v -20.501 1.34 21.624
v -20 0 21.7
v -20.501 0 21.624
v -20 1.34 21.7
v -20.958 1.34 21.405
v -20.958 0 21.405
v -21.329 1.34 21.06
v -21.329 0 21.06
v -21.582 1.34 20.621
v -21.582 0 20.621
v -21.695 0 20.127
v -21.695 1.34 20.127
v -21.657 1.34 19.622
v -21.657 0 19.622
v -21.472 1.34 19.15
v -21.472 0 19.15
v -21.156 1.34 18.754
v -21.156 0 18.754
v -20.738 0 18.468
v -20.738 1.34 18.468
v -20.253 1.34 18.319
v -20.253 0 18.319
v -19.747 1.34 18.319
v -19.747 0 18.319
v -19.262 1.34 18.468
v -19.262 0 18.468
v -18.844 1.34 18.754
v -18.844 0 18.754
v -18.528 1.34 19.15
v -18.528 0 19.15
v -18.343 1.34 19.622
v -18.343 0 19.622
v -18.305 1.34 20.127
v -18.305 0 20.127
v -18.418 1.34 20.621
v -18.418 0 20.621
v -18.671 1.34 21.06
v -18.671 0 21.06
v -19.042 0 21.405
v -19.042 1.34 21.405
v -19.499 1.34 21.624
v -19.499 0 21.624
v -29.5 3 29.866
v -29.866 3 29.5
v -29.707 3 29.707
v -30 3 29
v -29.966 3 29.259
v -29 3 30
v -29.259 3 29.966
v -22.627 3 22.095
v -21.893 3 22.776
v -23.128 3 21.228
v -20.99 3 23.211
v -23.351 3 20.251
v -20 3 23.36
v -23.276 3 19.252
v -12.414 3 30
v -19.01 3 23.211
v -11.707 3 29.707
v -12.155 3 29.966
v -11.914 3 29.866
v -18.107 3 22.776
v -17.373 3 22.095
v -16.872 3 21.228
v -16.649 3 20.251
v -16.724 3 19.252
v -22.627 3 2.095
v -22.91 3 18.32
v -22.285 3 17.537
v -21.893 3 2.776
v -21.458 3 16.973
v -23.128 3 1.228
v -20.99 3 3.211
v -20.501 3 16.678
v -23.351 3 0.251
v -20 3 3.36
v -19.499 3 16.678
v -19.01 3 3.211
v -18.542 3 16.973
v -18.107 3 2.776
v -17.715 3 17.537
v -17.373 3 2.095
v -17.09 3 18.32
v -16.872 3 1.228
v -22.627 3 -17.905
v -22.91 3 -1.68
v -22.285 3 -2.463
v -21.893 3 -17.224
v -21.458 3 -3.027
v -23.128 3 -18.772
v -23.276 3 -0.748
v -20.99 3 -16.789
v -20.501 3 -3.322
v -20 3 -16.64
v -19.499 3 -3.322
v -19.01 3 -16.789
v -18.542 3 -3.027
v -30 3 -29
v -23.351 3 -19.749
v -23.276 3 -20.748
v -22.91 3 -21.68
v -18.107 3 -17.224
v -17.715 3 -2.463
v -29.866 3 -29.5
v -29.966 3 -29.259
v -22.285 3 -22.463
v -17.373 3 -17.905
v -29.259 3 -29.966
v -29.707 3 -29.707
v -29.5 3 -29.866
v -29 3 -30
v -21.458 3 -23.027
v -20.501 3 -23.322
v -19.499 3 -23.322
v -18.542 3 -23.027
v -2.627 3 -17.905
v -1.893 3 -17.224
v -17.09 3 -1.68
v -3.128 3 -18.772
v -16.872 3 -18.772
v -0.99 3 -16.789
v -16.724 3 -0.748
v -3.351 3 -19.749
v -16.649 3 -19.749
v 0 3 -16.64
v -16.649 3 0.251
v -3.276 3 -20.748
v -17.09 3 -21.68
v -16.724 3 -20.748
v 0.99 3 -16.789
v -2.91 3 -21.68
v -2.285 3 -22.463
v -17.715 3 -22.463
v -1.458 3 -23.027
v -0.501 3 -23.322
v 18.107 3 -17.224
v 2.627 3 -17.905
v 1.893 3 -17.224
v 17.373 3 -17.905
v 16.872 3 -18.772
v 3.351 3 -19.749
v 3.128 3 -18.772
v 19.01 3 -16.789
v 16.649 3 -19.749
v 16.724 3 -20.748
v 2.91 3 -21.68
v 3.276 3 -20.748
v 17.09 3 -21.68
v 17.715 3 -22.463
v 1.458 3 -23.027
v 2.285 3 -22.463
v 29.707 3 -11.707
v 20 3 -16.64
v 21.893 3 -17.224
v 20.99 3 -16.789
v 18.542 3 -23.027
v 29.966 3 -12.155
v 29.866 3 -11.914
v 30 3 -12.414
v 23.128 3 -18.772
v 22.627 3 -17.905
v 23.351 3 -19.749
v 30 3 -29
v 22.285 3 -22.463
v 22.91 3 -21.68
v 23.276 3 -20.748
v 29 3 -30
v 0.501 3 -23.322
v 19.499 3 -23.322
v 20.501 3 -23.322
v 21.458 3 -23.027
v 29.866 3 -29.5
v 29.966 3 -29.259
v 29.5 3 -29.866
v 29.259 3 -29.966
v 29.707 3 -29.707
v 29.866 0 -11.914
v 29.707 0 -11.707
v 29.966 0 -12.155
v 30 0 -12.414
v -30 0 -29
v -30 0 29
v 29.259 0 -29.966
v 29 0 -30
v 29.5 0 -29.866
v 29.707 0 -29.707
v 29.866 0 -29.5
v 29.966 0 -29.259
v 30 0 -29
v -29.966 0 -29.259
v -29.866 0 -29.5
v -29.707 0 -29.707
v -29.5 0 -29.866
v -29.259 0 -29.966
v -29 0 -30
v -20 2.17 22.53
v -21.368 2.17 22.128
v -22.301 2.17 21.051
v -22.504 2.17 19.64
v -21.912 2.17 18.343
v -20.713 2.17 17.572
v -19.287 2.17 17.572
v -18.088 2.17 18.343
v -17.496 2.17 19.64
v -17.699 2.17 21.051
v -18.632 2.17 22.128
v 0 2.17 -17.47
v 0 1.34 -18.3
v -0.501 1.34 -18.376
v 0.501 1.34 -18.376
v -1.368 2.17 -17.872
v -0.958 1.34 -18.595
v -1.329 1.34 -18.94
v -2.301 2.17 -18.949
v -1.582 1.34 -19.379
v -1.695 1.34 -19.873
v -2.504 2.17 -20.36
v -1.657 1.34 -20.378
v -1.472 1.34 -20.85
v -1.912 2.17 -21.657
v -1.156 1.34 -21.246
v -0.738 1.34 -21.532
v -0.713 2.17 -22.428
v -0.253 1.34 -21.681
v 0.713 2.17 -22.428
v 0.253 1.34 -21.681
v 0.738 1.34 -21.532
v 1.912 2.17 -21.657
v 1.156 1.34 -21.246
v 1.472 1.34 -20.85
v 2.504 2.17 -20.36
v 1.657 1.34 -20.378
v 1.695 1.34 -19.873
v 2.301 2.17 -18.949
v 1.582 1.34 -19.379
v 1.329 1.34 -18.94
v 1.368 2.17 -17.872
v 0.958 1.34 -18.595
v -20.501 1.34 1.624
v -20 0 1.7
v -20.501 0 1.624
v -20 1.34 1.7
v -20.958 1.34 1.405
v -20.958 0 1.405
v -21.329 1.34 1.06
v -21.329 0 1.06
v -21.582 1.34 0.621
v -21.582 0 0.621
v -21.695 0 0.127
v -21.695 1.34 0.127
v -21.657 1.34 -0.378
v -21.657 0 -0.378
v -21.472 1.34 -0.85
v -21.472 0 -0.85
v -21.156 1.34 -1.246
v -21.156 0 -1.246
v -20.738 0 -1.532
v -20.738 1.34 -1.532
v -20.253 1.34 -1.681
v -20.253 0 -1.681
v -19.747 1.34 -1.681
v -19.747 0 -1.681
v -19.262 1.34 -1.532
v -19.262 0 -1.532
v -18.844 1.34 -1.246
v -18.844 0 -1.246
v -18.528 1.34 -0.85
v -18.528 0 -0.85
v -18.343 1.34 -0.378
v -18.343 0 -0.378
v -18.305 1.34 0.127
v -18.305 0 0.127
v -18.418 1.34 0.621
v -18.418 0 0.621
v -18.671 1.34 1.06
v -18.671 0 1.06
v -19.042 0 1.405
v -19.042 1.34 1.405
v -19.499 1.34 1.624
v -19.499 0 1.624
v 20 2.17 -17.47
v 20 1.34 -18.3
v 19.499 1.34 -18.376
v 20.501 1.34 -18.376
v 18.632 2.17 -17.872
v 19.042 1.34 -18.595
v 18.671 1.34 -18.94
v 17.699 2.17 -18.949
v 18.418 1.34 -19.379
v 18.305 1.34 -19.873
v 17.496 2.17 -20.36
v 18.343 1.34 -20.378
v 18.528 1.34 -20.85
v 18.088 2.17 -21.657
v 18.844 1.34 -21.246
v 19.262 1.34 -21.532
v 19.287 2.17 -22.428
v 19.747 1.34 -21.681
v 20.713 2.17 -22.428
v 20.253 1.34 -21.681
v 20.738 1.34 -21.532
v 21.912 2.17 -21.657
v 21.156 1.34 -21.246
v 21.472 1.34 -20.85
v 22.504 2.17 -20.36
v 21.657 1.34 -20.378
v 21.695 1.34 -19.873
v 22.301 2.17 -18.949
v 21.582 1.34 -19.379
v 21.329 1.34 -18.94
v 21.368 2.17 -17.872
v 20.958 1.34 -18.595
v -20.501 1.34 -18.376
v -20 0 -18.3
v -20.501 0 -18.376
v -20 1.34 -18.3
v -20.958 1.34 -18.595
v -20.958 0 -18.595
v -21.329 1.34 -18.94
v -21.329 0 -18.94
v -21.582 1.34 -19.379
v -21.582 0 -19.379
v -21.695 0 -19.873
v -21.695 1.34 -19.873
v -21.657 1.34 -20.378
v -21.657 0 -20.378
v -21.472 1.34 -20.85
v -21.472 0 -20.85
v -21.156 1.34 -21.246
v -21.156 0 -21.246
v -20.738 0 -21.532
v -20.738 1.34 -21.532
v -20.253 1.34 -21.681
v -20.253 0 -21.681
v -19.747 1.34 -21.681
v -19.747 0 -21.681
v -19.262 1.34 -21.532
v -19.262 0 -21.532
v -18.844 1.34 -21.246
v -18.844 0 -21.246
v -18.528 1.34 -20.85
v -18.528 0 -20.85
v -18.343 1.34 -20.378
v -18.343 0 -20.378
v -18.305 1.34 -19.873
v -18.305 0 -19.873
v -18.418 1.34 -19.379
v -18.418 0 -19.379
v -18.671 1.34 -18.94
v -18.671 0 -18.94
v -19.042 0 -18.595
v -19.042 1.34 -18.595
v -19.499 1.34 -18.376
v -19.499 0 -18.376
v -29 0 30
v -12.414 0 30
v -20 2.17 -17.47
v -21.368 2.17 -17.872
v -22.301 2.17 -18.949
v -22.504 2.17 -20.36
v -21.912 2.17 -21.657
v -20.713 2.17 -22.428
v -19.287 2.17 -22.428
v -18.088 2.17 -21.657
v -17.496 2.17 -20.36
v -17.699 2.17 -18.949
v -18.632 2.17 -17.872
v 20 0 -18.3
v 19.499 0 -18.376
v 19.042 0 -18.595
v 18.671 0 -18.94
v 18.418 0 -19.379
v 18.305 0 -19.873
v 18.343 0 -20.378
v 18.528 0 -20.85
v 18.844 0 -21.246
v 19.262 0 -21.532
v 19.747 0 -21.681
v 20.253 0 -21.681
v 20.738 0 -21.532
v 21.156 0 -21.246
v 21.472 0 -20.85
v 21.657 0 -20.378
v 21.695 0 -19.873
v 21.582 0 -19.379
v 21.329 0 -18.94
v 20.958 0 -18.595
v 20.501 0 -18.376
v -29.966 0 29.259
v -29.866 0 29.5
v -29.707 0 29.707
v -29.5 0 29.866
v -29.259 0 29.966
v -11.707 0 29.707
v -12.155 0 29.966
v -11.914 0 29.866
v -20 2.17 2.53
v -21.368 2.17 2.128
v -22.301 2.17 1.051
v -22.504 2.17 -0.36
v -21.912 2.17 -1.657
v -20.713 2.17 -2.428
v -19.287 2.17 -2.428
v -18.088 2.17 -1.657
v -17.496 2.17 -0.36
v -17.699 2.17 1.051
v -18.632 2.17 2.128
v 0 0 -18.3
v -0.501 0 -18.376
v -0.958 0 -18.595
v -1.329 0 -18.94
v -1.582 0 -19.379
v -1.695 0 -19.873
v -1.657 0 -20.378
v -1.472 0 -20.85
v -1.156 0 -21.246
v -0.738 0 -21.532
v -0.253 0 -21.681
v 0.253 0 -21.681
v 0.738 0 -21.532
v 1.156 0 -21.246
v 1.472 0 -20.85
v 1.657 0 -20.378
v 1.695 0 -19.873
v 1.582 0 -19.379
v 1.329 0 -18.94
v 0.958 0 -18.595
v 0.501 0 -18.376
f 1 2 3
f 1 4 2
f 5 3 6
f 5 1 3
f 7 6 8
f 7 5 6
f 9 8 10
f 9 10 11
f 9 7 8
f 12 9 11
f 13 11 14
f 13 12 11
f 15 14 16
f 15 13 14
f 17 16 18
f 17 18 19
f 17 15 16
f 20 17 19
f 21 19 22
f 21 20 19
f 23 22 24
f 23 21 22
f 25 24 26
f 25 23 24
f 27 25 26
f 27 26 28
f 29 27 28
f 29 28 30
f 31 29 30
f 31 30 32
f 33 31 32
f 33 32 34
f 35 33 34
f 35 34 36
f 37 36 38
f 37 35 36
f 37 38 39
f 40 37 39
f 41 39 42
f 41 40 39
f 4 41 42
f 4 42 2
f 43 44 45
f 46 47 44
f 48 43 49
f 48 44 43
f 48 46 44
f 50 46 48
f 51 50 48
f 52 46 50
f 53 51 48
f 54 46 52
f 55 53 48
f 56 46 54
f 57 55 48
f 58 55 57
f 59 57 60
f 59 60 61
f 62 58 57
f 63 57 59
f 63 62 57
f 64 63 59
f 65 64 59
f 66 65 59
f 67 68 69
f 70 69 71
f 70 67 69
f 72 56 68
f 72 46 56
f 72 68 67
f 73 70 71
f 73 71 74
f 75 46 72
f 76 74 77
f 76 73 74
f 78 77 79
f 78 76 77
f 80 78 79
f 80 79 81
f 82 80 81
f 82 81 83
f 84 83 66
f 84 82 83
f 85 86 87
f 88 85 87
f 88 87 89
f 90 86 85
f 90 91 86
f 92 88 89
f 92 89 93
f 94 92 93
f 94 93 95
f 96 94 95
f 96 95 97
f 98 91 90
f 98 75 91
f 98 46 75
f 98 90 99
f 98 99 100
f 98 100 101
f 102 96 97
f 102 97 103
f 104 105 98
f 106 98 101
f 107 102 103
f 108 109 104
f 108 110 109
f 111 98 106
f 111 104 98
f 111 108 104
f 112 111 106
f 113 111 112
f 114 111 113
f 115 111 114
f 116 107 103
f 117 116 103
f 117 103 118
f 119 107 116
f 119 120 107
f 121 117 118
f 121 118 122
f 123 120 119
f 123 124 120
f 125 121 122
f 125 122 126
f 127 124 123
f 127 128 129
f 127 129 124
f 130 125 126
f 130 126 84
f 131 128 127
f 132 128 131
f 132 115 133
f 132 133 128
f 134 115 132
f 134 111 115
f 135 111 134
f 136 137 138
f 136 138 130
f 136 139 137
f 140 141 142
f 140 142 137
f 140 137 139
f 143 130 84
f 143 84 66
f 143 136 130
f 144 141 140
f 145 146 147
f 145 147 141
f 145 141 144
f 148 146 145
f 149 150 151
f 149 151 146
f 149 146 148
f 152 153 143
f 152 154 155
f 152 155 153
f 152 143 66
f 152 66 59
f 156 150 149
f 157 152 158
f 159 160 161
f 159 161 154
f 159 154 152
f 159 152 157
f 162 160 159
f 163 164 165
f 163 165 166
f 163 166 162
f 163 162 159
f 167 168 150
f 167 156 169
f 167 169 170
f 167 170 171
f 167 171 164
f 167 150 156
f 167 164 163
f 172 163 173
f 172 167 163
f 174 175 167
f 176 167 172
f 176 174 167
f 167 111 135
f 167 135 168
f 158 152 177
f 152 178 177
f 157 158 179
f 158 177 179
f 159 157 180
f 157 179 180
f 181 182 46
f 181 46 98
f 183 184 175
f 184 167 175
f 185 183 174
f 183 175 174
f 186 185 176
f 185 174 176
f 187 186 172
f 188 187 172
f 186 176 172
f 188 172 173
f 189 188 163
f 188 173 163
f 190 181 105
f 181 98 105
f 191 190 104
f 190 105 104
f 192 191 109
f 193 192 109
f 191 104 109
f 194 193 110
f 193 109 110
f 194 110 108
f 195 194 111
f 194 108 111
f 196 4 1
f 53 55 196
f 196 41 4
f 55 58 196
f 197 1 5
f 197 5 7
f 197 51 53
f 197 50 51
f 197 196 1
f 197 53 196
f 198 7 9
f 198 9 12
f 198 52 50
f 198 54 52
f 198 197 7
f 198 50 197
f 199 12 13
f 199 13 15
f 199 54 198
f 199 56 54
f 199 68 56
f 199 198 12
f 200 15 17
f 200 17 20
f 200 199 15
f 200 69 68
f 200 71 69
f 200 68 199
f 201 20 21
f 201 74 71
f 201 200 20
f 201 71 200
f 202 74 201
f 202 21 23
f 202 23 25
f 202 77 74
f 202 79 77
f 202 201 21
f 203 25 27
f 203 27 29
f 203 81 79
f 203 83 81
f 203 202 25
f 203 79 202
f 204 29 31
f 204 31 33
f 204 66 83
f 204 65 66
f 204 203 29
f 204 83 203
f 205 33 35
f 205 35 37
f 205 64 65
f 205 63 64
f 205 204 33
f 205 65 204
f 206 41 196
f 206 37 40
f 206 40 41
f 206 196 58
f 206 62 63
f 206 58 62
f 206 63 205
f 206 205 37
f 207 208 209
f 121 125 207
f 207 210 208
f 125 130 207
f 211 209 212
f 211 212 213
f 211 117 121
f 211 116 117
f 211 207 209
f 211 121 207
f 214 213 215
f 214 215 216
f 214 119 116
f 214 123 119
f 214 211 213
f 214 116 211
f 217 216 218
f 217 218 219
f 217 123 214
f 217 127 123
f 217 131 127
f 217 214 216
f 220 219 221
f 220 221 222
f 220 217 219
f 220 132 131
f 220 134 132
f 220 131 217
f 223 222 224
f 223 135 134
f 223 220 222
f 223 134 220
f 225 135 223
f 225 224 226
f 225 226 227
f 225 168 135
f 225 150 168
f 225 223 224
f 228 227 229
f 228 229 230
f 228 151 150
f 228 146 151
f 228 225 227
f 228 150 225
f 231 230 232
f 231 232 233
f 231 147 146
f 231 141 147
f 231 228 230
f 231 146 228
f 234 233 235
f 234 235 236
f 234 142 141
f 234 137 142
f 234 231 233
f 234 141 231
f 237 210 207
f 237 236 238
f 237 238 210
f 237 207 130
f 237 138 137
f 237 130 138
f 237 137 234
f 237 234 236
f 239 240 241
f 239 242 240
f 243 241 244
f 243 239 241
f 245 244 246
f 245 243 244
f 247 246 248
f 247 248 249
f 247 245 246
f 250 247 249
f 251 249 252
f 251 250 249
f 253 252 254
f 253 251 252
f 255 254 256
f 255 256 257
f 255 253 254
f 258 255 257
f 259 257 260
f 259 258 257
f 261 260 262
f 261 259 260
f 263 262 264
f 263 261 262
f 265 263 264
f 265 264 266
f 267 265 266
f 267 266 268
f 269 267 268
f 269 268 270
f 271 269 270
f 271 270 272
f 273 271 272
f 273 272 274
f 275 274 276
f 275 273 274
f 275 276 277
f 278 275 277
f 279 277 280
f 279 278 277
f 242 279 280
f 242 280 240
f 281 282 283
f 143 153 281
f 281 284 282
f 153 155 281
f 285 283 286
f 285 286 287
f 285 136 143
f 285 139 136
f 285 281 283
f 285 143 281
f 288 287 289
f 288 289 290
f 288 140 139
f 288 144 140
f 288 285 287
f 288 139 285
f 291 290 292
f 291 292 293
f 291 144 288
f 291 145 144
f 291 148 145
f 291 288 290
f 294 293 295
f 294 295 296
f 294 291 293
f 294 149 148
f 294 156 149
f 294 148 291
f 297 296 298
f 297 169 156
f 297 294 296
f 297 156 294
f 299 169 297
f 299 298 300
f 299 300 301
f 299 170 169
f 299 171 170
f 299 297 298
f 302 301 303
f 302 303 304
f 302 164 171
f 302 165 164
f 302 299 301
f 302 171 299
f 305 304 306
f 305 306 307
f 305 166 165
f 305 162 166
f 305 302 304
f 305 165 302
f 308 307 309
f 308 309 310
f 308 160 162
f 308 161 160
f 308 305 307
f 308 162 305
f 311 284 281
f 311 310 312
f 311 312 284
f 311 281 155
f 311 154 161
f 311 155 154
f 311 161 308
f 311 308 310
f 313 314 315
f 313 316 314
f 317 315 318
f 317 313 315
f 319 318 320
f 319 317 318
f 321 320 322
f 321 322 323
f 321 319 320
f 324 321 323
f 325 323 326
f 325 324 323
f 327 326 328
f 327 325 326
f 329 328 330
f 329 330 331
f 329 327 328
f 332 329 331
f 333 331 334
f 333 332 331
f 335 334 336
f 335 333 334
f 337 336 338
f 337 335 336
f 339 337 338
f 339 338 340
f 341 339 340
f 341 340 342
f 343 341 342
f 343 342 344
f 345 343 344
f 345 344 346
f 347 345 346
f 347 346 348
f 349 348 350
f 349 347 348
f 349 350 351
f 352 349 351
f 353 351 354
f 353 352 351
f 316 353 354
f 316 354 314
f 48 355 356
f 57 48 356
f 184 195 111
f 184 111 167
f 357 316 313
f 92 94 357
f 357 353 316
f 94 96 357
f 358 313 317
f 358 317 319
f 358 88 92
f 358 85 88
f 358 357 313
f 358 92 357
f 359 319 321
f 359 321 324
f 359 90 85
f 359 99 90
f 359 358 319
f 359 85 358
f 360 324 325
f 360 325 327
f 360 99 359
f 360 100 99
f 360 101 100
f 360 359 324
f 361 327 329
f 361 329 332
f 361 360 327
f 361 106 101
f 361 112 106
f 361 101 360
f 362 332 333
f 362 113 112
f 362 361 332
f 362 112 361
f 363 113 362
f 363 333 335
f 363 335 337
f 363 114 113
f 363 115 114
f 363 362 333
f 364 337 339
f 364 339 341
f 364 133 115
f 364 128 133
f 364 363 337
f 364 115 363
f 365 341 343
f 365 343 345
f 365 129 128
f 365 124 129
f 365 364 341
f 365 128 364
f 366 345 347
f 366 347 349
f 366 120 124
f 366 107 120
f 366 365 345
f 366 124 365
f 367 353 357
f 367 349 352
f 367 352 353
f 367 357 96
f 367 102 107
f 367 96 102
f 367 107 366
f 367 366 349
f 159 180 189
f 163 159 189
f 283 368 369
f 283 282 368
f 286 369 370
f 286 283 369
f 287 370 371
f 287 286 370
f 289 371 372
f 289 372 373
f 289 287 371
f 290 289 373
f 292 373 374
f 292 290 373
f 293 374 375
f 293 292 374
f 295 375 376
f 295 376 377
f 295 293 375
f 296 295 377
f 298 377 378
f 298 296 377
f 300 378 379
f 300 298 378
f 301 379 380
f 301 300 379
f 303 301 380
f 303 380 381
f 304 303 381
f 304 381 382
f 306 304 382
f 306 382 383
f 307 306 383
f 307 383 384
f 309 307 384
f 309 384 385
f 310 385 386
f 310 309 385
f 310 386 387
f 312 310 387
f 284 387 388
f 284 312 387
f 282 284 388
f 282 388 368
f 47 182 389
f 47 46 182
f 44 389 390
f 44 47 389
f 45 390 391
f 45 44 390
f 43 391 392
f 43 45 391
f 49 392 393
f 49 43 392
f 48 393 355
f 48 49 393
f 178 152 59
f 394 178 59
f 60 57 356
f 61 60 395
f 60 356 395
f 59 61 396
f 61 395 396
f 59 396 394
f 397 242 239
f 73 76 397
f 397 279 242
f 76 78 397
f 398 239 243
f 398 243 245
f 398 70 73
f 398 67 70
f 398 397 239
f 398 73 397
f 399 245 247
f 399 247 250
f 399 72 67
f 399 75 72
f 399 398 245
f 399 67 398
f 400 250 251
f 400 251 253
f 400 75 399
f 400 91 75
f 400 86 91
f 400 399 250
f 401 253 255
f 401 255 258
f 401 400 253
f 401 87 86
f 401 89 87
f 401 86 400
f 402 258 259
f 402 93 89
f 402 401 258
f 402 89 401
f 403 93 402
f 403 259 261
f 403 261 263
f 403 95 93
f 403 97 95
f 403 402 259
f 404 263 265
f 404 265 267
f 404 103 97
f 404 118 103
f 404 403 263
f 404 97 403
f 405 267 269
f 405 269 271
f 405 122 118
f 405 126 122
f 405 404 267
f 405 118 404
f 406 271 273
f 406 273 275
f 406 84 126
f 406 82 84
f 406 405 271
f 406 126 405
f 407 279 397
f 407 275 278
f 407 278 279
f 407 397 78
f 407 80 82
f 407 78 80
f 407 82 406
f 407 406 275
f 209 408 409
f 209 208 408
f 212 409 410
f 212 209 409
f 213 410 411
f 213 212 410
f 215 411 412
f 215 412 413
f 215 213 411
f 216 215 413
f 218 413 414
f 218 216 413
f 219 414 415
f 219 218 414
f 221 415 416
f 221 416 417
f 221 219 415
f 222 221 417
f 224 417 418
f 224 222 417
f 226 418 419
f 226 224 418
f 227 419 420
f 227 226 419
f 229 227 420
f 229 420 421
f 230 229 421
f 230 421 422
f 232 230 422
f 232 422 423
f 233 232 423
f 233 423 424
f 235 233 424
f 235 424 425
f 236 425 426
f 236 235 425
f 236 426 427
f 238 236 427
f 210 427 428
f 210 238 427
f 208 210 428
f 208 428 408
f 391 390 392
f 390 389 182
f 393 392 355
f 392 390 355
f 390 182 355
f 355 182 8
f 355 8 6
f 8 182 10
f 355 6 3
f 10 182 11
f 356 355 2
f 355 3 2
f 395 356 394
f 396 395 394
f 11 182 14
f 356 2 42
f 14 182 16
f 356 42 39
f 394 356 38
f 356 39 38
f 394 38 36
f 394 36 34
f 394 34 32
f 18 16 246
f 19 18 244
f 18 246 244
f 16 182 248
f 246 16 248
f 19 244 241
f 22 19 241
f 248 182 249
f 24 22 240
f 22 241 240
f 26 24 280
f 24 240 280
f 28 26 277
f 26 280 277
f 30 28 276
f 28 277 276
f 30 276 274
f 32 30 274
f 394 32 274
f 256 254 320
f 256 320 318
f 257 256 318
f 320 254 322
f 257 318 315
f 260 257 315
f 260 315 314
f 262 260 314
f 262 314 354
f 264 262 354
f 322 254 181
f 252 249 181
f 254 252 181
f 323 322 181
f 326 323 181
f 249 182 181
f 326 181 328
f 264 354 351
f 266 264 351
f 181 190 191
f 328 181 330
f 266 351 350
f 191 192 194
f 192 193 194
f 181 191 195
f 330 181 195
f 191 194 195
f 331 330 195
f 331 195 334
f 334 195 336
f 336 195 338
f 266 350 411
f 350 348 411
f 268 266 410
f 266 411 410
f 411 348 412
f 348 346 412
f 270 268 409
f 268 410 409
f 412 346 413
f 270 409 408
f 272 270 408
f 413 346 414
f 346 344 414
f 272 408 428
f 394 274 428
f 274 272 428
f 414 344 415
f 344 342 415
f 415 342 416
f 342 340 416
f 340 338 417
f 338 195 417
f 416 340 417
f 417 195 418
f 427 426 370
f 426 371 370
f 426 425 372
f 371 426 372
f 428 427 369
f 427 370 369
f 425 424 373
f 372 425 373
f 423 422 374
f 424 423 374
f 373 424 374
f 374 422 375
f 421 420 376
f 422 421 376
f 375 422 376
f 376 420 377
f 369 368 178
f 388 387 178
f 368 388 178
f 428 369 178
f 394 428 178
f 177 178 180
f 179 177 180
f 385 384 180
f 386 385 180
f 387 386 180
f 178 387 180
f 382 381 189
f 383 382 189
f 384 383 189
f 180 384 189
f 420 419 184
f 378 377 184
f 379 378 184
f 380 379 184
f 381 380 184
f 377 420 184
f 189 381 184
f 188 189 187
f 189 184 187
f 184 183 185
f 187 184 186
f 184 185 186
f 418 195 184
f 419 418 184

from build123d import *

# Parameters (mm, degrees)
SKETCH2_W                                    = 60
SKETCH2_H                                    = 60
BOSS_EXTRUDE1_DEPTH                          = 3
CUT_EXTRUDE1_DEPTH                           = 10
CSK_FOR_M3_HEX_SOCKET_COUNTERSUNK_CA_2_COUNT = 2
CSK_FOR_M3_HEX_SOCKET_COUNTERSUNK_CA_2_PITCH = 20
CSK_FOR_M3_HEX_SOCKET_COUNTERSUNK_CA_3_COUNT = 2
CSK_FOR_M3_HEX_SOCKET_COUNTERSUNK_CA_3_PITCH = 40
CSK_FOR_M3_HEX_SOCKET_COUNTERSUNK_CA_4_COUNT = 2
CSK_FOR_M3_HEX_SOCKET_COUNTERSUNK_CA_4_PITCH = 20
CSK_FOR_M3_HEX_SOCKET_COUNTERSUNK_CA_5_COUNT = 2
CSK_FOR_M3_HEX_SOCKET_COUNTERSUNK_CA_5_PITCH = 40
FILLET1_R                                    = 1


with BuildPart() as part:
    # Sketch2 → Boss-Extrude1 (new body)
    with BuildSketch(Plane(origin=(0, 0, 0), x_dir=(1, 0, 0), z_dir=(0, 1, 0))):
        Rectangle(SKETCH2_W, SKETCH2_H)
    extrude(amount=BOSS_EXTRUDE1_DEPTH)

    # Sketch3 → Cut-Extrude1 (cut)
    with BuildSketch(Plane(origin=(0, 3, 0), x_dir=(1, 0, 0), z_dir=(0, 1, 0))):
        Polygon((30, 12), (-12, -30), (30, -30), align=None)
    extrude(amount=-CUT_EXTRUDE1_DEPTH, mode=Mode.SUBTRACT)

    # Sketch6 → CSK for M3 Hex Socket Countersunk Cap Screw1 (revolve, cut)
    with BuildSketch(Plane(origin=(-20, 3, -20), x_dir=(0, 0, 1), z_dir=(1, 0, 0))):
        Polygon((0, 0), (0, 3), (1.7, 3), (1.7, 1.66), (3.36, 0), align=None)
    csk_for_m3_hex_socket_countersunk_cap_sc = revolve(axis=Axis((-20, 9.35, -20), (0, -1, 0)), mode=Mode.SUBTRACT)

    # CSK for M3 Hex Socket Countersunk Ca 2: CSK for M3 Hex Socket Countersunk Cap Screw1 ×2
    with Locations(*[(i * CSK_FOR_M3_HEX_SOCKET_COUNTERSUNK_CA_2_PITCH, 0, 0) for i in range(1, CSK_FOR_M3_HEX_SOCKET_COUNTERSUNK_CA_2_COUNT)]):
        add(csk_for_m3_hex_socket_countersunk_cap_sc, mode=Mode.SUBTRACT)

    # CSK for M3 Hex Socket Countersunk Ca 3: CSK for M3 Hex Socket Countersunk Cap Screw1 ×2
    with Locations(*[(i * CSK_FOR_M3_HEX_SOCKET_COUNTERSUNK_CA_3_PITCH, 0, 0) for i in range(1, CSK_FOR_M3_HEX_SOCKET_COUNTERSUNK_CA_3_COUNT)]):
        add(csk_for_m3_hex_socket_countersunk_cap_sc, mode=Mode.SUBTRACT)

    # CSK for M3 Hex Socket Countersunk Ca 4: CSK for M3 Hex Socket Countersunk Cap Screw1 ×2
    with Locations(*[(0, 0, i * CSK_FOR_M3_HEX_SOCKET_COUNTERSUNK_CA_4_PITCH) for i in range(1, CSK_FOR_M3_HEX_SOCKET_COUNTERSUNK_CA_4_COUNT)]):
        add(csk_for_m3_hex_socket_countersunk_cap_sc, mode=Mode.SUBTRACT)

    # CSK for M3 Hex Socket Countersunk Ca 5: CSK for M3 Hex Socket Countersunk Cap Screw1 ×2
    with Locations(*[(0, 0, i * CSK_FOR_M3_HEX_SOCKET_COUNTERSUNK_CA_5_PITCH) for i in range(1, CSK_FOR_M3_HEX_SOCKET_COUNTERSUNK_CA_5_COUNT)]):
        add(csk_for_m3_hex_socket_countersunk_cap_sc, mode=Mode.SUBTRACT)

    # Fillet1
    fillet1_edges = [part.edges().sort_by_distance(p)[0] for p in [
        (30, 1.5, -12),
        (-12, 1.5, 30),
        (-30, 1.5, 30),
        (-30, 1.5, -30),
        (30, 1.5, -30),
    ]]
    fillet(fillet1_edges, radius=FILLET1_R)


solid = part.part
